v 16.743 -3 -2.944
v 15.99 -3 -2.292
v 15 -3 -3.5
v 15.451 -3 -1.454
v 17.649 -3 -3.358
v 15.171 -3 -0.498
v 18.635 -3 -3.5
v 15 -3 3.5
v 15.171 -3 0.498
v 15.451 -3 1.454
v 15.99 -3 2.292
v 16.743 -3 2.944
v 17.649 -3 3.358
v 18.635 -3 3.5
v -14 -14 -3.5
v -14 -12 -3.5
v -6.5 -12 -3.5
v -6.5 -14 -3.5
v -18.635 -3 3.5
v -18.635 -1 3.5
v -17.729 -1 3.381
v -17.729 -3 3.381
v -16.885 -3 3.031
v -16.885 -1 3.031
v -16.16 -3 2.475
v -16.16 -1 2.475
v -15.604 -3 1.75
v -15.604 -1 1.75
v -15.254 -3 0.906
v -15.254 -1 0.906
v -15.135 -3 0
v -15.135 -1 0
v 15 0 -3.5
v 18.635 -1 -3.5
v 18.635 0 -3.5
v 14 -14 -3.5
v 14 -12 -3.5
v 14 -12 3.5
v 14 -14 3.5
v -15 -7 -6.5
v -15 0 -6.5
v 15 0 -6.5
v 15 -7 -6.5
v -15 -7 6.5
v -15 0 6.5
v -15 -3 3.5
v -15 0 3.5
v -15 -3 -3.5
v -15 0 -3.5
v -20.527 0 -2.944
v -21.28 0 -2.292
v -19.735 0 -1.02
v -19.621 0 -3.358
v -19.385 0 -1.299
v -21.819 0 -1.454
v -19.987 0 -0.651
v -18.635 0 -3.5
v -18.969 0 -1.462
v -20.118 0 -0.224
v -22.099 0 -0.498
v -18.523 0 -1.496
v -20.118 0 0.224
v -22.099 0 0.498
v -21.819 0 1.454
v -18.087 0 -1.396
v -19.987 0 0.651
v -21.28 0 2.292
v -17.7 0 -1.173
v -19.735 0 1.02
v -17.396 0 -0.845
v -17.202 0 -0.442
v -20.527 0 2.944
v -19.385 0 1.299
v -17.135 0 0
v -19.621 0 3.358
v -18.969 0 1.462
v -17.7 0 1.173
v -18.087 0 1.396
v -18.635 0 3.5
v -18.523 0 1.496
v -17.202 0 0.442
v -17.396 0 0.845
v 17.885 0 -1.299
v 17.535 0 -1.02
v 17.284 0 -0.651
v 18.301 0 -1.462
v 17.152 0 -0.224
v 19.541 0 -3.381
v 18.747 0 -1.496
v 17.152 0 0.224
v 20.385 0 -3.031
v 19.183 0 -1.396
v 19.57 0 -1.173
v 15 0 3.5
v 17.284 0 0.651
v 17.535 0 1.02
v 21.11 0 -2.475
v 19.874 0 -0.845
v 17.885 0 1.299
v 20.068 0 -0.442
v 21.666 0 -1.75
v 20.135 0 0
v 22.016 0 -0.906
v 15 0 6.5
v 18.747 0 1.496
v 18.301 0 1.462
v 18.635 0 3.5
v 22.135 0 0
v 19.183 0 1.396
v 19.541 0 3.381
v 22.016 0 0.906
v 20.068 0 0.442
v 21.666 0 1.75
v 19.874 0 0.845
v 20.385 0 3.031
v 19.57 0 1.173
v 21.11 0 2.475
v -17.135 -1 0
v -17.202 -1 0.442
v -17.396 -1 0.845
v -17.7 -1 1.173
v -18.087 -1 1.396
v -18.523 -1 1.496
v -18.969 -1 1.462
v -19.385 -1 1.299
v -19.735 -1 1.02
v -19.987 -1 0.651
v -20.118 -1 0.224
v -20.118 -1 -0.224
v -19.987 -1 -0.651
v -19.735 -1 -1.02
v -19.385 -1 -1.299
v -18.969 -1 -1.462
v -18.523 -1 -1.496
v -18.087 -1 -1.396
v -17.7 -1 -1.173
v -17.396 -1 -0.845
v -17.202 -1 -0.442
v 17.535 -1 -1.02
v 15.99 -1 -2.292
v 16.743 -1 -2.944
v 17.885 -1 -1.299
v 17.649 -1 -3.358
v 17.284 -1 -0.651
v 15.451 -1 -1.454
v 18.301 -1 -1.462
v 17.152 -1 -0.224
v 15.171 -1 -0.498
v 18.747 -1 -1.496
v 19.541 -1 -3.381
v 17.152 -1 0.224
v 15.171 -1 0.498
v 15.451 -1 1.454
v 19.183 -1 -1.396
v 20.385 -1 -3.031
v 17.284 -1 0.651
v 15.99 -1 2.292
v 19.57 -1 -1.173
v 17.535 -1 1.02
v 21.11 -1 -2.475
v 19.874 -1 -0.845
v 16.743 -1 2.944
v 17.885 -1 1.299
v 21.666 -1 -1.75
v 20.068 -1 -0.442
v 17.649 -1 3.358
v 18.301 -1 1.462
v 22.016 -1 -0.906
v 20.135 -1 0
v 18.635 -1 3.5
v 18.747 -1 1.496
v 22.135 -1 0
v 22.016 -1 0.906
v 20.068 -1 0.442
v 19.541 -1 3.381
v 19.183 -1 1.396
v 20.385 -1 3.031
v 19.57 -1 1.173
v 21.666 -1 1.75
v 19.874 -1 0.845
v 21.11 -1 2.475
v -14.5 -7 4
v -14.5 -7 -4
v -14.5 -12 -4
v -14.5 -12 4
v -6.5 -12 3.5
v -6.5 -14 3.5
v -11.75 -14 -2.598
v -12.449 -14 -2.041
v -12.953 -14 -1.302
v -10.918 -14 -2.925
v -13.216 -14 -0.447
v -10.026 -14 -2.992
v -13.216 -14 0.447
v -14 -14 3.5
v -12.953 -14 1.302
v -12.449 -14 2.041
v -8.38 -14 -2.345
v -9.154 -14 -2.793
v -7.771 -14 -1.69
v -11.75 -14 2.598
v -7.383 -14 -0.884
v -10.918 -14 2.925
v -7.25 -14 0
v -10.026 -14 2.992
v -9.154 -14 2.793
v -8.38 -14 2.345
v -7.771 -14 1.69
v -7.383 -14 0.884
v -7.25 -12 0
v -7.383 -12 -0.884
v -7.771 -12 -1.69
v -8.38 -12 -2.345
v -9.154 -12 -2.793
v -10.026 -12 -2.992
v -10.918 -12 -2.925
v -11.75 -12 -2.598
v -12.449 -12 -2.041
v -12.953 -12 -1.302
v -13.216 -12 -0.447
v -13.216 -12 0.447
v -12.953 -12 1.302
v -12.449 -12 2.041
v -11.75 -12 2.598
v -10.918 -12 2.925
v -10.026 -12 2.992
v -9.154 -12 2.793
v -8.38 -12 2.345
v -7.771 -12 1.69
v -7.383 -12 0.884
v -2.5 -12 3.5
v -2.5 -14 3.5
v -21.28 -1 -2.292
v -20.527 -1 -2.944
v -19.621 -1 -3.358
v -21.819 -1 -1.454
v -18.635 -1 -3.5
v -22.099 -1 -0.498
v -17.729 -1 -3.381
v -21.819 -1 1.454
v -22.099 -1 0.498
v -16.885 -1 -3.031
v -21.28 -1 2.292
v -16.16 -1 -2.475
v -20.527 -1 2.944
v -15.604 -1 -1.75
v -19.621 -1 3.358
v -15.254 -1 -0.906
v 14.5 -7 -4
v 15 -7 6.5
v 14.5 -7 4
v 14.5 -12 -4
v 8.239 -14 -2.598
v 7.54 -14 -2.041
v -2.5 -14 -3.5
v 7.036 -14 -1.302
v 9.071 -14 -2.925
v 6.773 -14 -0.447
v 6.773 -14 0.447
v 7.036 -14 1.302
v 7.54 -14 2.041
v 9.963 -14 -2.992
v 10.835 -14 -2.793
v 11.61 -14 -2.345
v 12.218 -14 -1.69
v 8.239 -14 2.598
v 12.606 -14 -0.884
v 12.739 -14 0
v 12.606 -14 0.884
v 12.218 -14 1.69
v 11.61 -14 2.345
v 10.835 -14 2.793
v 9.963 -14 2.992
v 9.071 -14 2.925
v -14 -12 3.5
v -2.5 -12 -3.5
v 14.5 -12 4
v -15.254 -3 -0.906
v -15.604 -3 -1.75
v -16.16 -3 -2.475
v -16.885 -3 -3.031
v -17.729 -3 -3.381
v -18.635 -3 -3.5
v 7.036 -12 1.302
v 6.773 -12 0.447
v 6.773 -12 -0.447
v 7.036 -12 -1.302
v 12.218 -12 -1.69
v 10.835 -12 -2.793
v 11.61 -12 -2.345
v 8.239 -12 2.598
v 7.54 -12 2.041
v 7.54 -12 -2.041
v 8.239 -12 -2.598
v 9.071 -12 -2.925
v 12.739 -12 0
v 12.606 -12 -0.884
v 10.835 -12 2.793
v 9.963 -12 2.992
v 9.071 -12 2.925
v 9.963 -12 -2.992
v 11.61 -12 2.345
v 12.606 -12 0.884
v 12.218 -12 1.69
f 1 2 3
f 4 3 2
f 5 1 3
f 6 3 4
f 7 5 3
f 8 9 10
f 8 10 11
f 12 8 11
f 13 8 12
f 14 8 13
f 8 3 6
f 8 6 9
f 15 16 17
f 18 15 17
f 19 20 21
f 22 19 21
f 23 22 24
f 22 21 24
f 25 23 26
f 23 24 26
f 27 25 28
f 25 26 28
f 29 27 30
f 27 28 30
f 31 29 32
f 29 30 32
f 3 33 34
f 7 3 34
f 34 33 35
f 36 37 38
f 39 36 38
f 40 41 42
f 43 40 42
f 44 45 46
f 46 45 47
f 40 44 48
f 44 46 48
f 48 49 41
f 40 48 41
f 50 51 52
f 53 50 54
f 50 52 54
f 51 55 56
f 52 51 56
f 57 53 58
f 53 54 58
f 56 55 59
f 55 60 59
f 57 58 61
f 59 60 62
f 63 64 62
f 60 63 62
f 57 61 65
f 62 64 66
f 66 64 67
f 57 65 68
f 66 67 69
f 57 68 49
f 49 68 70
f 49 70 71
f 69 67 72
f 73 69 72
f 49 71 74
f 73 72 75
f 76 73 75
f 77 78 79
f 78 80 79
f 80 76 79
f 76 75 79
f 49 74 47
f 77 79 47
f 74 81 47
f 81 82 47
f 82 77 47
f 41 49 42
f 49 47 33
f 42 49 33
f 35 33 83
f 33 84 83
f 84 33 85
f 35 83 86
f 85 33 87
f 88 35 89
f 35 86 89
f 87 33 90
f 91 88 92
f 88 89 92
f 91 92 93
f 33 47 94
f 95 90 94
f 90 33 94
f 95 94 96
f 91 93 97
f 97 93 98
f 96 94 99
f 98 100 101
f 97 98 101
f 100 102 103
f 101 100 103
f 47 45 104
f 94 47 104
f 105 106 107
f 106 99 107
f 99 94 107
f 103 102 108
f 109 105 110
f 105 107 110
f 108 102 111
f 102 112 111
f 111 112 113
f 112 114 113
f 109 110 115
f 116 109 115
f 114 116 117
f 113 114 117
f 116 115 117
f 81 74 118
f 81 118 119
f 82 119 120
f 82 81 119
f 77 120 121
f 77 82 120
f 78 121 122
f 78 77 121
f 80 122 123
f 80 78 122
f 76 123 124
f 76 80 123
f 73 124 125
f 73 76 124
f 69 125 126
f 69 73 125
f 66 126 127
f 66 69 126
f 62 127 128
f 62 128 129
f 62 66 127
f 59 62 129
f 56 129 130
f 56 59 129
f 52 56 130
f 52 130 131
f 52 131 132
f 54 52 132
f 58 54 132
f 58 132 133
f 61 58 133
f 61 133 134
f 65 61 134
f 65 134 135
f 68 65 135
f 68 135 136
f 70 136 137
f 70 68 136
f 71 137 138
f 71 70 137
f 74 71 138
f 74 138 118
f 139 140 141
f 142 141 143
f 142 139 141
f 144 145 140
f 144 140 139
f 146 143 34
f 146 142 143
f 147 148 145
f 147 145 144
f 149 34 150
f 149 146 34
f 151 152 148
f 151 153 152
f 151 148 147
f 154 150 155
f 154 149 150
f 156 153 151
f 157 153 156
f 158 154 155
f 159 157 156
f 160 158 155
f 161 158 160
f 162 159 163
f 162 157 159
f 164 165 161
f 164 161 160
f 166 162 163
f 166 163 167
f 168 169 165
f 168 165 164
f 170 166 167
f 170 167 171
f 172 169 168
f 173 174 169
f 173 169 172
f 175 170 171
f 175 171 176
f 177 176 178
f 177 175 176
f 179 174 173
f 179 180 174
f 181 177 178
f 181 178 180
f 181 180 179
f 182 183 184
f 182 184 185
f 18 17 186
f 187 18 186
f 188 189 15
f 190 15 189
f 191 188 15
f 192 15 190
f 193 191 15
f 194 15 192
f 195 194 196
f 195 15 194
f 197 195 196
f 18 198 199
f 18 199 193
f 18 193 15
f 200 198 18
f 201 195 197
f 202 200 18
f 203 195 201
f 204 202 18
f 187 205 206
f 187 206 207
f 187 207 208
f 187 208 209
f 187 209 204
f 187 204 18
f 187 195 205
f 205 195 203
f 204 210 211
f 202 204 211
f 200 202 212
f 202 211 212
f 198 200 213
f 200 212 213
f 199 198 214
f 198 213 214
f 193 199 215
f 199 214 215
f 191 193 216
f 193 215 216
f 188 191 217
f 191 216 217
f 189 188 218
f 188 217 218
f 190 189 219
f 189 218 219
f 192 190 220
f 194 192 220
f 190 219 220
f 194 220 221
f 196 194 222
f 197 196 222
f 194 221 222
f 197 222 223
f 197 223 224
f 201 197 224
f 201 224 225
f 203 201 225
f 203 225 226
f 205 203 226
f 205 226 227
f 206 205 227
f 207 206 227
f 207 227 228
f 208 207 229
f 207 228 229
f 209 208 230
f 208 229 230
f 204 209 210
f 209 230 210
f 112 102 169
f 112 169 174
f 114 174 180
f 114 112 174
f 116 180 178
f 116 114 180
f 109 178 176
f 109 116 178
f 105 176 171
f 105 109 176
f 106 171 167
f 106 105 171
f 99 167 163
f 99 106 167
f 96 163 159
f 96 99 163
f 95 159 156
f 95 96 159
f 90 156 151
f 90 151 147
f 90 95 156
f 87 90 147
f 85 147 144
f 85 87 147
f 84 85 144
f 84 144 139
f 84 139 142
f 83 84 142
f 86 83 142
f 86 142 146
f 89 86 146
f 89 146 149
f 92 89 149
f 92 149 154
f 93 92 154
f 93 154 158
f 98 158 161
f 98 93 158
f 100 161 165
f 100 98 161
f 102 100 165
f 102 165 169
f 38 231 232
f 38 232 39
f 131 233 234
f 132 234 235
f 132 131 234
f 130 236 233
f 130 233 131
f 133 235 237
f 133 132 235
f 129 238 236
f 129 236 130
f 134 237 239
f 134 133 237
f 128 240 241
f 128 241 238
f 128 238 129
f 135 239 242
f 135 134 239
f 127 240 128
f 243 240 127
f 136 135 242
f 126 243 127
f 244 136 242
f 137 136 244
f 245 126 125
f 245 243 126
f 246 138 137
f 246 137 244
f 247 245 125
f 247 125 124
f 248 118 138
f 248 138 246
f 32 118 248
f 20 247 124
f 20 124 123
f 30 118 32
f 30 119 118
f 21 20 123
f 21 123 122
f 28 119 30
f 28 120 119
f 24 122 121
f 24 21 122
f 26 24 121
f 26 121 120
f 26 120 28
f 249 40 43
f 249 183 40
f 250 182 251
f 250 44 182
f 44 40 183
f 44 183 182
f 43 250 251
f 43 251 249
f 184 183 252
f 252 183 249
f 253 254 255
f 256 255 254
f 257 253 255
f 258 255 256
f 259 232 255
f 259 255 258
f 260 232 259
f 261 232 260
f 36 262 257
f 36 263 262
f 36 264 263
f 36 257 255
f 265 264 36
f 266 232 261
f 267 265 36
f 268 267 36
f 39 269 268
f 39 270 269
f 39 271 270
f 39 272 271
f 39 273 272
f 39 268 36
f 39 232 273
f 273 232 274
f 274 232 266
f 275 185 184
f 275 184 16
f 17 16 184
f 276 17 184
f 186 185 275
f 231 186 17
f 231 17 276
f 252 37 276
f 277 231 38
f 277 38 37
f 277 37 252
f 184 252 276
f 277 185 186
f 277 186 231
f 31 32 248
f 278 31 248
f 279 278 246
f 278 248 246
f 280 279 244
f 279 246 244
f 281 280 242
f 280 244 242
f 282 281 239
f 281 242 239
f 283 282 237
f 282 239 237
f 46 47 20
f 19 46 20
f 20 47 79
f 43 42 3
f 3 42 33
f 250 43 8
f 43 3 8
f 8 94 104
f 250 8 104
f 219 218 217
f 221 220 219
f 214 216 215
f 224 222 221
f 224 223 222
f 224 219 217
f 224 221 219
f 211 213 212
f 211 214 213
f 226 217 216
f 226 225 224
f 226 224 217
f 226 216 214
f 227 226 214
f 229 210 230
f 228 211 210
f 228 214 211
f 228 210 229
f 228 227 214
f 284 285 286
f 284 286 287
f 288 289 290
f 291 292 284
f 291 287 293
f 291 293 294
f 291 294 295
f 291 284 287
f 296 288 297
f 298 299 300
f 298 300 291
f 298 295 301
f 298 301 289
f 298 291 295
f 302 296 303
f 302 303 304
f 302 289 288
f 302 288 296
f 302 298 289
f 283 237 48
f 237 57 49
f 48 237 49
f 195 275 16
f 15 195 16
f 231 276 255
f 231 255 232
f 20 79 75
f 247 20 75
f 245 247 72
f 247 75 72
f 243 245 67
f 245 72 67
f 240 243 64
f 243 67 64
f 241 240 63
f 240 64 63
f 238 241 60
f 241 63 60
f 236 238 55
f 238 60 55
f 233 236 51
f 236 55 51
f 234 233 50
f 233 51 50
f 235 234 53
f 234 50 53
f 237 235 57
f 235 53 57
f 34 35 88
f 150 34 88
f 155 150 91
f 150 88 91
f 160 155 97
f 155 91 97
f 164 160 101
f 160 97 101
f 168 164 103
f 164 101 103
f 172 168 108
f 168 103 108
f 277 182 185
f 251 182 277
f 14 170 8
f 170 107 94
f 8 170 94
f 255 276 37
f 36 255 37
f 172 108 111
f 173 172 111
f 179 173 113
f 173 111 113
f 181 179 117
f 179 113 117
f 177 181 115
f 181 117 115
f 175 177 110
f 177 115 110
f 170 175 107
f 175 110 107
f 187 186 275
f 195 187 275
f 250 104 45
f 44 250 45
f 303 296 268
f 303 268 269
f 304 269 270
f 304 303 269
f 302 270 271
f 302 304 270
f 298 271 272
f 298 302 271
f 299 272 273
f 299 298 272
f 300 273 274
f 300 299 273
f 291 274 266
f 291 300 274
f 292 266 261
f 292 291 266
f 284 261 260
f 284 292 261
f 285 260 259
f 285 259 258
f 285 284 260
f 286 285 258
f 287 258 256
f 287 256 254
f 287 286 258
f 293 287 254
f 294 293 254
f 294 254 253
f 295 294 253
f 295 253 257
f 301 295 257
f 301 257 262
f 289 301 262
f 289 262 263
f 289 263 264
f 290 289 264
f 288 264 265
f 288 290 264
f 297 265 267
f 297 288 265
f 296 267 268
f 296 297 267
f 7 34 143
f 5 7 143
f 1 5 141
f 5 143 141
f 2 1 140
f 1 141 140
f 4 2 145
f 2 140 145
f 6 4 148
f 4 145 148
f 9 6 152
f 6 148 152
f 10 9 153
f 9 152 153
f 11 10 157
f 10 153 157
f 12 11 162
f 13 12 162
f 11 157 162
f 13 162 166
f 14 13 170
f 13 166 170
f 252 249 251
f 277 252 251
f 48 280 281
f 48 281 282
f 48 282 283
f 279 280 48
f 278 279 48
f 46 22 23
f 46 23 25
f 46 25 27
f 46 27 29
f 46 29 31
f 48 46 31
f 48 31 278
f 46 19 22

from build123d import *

# Parameters (mm, degrees)
F1_DEPTH = 7
F2_W     = 29
F2_H     = 8
F3_DEPTH = 5
F4_W     = 16.5
F4_H     = 7
F4_R     = 3
F5_DEPTH = 2
F0_R     = 1.5
F6_DEPTH = 1
F7_DEPTH = 3


with BuildPart() as f1:
    # F0 (on Front) → F1 (new body)
    with BuildSketch(Plane.XZ):
        Polygon((15, 3.5), (15, 6.5), (-15, 6.5), (-15, 3.5), (-15, -3.5), (-15, -6.5), (15, -6.5), (15, -3.5), align=None)
    extrude(amount=F1_DEPTH)

    # F2 (on face) → F3 (join)
    with BuildSketch(Plane.XZ.offset(7)):
        Rectangle(F2_W, F2_H)
    extrude(amount=F3_DEPTH)

    # F4 (on face) → F5 (join)
    with BuildSketch(Plane.XZ.offset(12)):
        with BuildLine():
            Line((-6.5, 3.5), (-14, 3.5))
            Line((-14, 3.5), (-14, 0))
            Line((-14, 0), (-13.25, 0))
            ThreePointArc((-13.25, 0), (-10.25, 3), (-7.25, 0))
            Line((-7.25, 0), (-6.5, 0))
            Line((-6.5, 0), (-6.5, 3.5))
        make_face()
        with BuildLine():
            Line((-13.25, 0), (-14, 0))
            Line((-14, 0), (-14, -3.5))
            Line((-14, -3.5), (-6.5, -3.5))
            Line((-6.5, -3.5), (-6.5, 0))
            Line((-6.5, 0), (-7.25, 0))
            ThreePointArc((-7.25, 0), (-10.25, -3), (-13.25, 0))
        make_face()
        with Locations((5.75, 0)):
            Rectangle(F4_W, F4_H)
        with Locations((9.739062, 0)):
            Circle(F4_R, mode=Mode.SUBTRACT)
    extrude(amount=F5_DEPTH)

    # F0 (on Front) → F6 (join)
    with BuildSketch(Plane.XZ):
        with BuildLine():
            Line((-15, -3.5), (-15, 3.5))
            Line((-15, 3.5), (-18.635049, 3.5))
            ThreePointArc((-18.635049, 3.5), (-16.160176, 2.474874), (-15.135049, 0))
            ThreePointArc((-15.135049, 0), (-16.160176, -2.474874), (-18.635049, -3.5))
            Line((-18.635049, -3.5), (-15, -3.5))
        make_face()
        with BuildLine():
            Line((18.635049, 3.5), (15, 3.5))
            Line((15, 3.5), (15, -3.5))
            Line((15, -3.5), (18.635049, -3.5))
            ThreePointArc((18.635049, -3.5), (15.135049, 0), (18.635049, 3.5))
        make_face()
        with BuildLine():
            ThreePointArc((-15.135049, 0), (-16.160176, 2.474874), (-18.635049, 3.5))
            ThreePointArc((-18.635049, 3.5), (-22.135049, 0), (-18.635049, -3.5))
            ThreePointArc((-18.635049, -3.5), (-16.160176, -2.474874), (-15.135049, 0))
        make_face()
        with Locations((-18.635049, 0)):
            Circle(F0_R, mode=Mode.SUBTRACT)
        with BuildLine():
            ThreePointArc((22.135049, 0), (21.109923, 2.474874), (18.635049, 3.5))
            ThreePointArc((18.635049, 3.5), (15.135049, 0), (18.635049, -3.5))
            ThreePointArc((18.635049, -3.5), (21.109923, -2.474874), (22.135049, 0))
        make_face()
        with Locations((18.635049, 0)):
            Circle(F0_R, mode=Mode.SUBTRACT)
    extrude(amount=F6_DEPTH)

    # F0 (on Front) → F7 (join)
    with BuildSketch(Plane.XZ):
        with BuildLine():
            Line((-15, -3.5), (-15, 3.5))
            Line((-15, 3.5), (-18.635049, 3.5))
            ThreePointArc((-18.635049, 3.5), (-16.160176, 2.474874), (-15.135049, 0))
            ThreePointArc((-15.135049, 0), (-16.160176, -2.474874), (-18.635049, -3.5))
            Line((-18.635049, -3.5), (-15, -3.5))
        make_face()
        with BuildLine():
            Line((18.635049, 3.5), (15, 3.5))
            Line((15, 3.5), (15, -3.5))
            Line((15, -3.5), (18.635049, -3.5))
            ThreePointArc((18.635049, -3.5), (15.135049, 0), (18.635049, 3.5))
        make_face()
    extrude(amount=F7_DEPTH)


solid = f1.part
